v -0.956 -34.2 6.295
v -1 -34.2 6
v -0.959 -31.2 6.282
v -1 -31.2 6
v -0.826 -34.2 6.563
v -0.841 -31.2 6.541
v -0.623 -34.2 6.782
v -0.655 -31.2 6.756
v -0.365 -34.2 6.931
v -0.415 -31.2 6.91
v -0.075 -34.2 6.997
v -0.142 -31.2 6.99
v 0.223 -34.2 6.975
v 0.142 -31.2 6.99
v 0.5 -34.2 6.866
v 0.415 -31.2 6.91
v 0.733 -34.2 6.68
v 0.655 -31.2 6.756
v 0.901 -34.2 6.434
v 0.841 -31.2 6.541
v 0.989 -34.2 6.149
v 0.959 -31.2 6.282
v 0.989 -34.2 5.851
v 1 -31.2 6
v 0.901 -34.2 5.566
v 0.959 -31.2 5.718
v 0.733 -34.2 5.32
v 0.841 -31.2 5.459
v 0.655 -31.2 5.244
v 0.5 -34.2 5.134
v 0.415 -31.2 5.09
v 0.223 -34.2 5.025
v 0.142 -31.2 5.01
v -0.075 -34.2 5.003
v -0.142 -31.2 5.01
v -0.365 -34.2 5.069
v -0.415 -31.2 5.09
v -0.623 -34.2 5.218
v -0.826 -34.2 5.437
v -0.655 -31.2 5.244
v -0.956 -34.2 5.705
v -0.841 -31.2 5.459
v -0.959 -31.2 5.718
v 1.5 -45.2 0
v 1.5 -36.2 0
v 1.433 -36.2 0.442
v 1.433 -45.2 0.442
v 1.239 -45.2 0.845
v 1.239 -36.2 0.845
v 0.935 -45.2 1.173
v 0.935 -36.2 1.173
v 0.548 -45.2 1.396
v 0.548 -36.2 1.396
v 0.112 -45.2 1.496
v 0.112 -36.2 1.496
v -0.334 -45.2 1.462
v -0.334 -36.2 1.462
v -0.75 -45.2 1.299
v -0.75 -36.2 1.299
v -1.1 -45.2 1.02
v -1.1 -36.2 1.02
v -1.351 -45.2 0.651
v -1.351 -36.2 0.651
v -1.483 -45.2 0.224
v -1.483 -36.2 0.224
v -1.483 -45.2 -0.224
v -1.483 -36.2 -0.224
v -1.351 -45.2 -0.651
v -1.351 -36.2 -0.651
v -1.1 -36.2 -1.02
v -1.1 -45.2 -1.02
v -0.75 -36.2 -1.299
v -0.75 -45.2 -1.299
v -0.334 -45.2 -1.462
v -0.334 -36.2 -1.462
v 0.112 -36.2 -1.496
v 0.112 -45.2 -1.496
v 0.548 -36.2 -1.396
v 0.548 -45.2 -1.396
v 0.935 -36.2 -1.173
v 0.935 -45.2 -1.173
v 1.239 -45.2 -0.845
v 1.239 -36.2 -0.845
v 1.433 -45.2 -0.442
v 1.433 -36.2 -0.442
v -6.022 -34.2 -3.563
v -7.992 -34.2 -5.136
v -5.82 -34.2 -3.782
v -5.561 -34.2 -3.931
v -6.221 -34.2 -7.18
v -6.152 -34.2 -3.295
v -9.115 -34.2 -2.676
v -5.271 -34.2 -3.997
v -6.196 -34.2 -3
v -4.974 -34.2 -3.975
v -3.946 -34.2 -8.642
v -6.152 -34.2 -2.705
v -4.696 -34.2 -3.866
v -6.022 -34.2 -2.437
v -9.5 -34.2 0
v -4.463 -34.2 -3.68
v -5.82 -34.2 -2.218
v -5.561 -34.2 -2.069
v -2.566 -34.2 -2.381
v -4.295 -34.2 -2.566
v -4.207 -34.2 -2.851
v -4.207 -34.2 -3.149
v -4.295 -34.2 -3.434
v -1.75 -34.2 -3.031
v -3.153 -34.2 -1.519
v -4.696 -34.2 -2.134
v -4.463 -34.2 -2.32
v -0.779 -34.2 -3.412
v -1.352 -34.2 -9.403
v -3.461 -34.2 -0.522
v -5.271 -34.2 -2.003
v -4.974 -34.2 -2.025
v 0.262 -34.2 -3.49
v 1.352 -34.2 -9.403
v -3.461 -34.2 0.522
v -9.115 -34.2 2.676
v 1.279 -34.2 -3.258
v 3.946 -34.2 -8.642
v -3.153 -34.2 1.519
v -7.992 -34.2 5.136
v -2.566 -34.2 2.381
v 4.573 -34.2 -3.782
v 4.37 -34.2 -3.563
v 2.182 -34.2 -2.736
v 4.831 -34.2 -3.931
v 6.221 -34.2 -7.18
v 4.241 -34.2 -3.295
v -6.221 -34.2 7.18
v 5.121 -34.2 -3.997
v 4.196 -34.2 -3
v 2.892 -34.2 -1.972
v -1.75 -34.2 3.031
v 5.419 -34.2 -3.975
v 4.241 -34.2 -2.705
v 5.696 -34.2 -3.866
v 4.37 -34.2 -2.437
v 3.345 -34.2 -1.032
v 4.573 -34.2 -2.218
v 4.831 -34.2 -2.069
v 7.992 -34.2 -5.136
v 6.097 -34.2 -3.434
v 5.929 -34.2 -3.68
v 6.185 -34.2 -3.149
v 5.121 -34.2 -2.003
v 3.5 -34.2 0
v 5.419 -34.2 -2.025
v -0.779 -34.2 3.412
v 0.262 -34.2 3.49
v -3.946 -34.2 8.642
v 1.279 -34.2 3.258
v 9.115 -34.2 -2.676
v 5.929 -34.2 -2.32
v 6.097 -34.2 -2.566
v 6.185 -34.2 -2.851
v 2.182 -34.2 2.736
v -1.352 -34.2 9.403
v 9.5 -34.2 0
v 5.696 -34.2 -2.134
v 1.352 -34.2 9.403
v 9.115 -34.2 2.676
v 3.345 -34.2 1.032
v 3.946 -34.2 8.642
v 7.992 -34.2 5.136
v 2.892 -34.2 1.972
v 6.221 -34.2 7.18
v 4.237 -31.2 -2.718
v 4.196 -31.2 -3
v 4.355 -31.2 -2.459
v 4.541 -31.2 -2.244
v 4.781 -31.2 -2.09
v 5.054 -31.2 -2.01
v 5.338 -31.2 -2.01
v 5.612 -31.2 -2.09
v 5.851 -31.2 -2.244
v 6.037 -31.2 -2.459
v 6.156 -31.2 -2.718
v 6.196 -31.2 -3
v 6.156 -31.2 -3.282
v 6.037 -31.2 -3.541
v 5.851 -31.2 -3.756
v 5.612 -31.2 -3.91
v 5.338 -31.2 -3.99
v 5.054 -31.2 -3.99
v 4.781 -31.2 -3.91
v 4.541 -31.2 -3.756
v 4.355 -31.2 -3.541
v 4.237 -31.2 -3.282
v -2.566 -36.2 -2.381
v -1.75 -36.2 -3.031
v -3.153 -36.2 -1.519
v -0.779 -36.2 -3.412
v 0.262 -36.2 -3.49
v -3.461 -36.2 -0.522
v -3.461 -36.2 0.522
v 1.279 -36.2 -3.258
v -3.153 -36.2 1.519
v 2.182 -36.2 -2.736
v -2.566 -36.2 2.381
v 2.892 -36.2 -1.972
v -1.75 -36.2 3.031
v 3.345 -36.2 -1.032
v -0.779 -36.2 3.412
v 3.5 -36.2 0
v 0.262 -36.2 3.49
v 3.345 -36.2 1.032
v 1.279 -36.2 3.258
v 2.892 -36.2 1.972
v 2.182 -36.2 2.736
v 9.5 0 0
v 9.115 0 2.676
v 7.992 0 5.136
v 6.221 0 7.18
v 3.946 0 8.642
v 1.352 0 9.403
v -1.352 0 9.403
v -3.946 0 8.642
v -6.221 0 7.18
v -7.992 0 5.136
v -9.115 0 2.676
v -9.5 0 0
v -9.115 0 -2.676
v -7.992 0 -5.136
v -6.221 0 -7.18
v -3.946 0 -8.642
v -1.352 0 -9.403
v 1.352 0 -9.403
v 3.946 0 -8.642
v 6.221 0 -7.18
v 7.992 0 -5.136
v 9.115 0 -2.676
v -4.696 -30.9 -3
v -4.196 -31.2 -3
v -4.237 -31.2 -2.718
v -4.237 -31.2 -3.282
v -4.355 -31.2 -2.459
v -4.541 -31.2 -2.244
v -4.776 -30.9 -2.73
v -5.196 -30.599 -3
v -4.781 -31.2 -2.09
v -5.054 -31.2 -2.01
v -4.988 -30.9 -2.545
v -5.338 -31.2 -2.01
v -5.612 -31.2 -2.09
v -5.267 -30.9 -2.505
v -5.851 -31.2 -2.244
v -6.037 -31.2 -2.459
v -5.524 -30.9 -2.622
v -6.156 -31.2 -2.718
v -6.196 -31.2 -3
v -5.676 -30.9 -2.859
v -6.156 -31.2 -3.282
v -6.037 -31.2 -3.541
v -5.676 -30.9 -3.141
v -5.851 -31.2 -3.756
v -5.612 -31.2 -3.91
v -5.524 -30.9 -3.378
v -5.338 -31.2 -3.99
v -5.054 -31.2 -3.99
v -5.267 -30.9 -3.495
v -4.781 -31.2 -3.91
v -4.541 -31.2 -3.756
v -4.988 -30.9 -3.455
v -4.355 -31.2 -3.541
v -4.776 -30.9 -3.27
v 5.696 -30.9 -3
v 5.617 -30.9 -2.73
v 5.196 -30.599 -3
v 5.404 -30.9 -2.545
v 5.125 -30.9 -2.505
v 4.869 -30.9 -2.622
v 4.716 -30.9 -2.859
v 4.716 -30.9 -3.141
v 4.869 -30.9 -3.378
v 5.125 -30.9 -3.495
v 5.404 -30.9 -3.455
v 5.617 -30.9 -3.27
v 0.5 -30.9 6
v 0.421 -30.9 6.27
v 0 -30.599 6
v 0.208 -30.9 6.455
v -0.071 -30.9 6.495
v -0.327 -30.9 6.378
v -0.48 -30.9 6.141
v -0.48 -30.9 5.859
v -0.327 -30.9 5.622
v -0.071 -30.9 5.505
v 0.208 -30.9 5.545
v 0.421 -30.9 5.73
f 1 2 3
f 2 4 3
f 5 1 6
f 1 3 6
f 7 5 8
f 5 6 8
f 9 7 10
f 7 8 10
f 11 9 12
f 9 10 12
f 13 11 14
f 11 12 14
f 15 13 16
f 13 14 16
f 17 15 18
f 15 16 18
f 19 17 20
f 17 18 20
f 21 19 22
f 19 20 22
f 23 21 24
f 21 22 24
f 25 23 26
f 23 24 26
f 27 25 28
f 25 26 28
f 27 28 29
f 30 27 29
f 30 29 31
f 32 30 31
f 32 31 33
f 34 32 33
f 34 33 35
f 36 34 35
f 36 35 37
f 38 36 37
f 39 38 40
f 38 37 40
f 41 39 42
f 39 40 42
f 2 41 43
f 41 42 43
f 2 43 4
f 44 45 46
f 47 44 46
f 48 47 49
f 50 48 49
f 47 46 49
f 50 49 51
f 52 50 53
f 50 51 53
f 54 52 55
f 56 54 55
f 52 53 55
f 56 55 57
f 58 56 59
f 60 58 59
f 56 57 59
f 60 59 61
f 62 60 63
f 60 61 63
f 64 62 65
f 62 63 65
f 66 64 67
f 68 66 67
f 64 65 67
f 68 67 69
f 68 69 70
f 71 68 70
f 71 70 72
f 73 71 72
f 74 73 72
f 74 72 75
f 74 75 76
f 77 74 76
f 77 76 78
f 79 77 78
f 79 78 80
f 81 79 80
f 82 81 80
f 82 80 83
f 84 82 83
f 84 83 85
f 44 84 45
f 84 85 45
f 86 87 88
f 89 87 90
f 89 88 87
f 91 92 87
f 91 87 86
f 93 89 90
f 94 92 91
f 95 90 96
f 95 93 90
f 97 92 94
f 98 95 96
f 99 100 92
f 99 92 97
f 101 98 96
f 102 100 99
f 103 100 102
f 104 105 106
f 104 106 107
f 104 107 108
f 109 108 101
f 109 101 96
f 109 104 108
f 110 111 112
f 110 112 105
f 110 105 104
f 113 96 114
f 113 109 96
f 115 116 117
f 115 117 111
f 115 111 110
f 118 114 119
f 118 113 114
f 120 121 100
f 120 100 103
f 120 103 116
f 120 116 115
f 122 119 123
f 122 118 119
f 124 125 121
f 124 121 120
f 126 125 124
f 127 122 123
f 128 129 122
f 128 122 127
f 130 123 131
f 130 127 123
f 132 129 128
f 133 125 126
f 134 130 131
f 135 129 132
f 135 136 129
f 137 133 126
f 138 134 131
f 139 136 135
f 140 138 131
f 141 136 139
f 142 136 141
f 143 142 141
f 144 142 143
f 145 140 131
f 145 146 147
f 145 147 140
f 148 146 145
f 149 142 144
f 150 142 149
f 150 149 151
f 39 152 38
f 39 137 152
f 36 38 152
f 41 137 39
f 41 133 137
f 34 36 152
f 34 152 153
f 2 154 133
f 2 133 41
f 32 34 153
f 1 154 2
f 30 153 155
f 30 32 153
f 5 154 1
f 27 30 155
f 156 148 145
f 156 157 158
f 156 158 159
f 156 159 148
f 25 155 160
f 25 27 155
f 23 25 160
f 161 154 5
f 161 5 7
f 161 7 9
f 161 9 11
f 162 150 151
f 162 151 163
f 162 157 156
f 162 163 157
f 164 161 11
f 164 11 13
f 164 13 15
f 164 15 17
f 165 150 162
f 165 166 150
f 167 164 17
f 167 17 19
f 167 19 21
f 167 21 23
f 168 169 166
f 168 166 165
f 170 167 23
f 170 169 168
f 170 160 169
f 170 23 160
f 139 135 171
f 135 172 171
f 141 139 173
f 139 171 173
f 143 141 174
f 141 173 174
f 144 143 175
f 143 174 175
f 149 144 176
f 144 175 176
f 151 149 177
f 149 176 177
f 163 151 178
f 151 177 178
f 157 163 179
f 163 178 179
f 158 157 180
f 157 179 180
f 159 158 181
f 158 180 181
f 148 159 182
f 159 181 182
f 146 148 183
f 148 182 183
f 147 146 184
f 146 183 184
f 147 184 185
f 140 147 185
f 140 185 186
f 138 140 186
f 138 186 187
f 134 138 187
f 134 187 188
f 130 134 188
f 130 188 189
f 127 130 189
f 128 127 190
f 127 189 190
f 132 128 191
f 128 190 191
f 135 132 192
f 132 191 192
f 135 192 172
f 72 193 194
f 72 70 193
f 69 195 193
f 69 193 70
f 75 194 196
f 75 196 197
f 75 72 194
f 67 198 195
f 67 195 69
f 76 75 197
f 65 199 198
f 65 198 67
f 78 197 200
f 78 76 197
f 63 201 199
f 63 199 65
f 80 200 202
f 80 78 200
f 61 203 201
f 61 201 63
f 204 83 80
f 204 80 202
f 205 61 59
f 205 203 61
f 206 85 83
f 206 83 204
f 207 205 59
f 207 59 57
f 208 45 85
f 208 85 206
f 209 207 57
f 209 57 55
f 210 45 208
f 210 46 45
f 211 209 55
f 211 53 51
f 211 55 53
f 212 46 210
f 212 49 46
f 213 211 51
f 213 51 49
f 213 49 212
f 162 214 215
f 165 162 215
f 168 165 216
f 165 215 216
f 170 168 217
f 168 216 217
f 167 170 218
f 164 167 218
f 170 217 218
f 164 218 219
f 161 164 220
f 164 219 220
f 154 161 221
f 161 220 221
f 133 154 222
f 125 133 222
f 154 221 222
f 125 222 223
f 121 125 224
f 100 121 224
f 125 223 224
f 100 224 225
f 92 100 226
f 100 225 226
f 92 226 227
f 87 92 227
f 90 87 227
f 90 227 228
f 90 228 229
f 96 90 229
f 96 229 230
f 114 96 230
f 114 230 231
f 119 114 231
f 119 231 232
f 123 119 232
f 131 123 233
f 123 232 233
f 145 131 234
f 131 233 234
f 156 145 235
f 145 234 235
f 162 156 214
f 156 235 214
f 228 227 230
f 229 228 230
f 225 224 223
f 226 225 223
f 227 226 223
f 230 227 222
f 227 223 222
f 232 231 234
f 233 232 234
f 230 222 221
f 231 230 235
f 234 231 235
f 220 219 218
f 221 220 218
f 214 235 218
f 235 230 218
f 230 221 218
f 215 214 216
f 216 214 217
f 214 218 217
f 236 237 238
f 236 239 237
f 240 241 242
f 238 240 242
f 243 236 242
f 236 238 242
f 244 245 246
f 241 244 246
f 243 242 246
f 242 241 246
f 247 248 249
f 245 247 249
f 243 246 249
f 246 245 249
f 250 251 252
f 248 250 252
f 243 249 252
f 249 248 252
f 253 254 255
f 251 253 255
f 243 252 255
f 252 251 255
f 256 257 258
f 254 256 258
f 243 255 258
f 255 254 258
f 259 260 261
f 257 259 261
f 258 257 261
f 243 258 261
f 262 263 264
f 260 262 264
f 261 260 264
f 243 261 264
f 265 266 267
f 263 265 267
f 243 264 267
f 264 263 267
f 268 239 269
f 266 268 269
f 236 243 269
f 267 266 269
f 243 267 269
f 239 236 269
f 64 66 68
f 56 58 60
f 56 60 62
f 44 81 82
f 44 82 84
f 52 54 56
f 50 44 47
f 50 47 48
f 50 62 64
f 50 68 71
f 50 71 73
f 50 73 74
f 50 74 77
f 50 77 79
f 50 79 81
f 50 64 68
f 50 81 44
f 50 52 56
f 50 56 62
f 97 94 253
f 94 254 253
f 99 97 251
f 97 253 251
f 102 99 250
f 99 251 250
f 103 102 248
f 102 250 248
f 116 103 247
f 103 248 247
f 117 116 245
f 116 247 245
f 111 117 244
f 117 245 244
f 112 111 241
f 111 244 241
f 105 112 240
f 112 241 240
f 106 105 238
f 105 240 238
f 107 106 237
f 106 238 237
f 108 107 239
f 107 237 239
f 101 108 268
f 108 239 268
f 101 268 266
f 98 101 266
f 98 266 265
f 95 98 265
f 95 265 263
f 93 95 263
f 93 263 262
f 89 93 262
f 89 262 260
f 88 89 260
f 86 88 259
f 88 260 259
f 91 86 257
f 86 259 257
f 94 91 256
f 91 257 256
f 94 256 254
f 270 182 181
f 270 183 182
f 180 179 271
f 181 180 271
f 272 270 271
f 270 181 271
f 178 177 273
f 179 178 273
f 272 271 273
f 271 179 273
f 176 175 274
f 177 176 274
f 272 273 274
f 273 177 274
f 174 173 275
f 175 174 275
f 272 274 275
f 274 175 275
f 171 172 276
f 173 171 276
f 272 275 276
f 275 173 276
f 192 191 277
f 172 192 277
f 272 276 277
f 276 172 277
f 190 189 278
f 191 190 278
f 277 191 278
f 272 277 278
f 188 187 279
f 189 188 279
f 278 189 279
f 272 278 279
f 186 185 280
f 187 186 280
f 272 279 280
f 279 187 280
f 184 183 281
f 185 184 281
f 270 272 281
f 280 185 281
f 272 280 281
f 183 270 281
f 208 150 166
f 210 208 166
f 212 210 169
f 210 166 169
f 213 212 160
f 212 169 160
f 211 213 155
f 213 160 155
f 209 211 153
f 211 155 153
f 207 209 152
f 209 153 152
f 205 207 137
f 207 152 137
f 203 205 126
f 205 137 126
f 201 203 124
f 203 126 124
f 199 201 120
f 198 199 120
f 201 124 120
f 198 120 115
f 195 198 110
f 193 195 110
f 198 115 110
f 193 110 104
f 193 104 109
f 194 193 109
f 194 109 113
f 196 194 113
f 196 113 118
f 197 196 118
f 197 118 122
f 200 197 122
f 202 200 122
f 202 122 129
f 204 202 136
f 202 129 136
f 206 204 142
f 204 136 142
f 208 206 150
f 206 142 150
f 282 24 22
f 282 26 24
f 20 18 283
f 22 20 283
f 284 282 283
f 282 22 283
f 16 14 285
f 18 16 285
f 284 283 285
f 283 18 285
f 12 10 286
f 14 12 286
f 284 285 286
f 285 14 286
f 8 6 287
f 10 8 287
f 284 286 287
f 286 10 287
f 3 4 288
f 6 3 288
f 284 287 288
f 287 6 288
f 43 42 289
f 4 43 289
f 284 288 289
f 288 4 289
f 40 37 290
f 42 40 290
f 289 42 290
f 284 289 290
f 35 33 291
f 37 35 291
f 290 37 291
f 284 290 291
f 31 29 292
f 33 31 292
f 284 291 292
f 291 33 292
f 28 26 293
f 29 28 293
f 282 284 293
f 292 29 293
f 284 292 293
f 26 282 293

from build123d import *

# Parameters (mm, degrees)
F0_R     = 9.5
F1_DEPTH = 34.2
F2_R     = 3.5
F3_DEPTH = 2
F4_R     = 1.5
F5_DEPTH = 9
F7_D     = 2
F7_DEPTH = 3
F7_TIP   = 0.600860619


with BuildPart() as f1:
    # F0 (on Front) → F1 (new body)
    with BuildSketch(Plane.XZ):
        Circle(F0_R)
    extrude(amount=F1_DEPTH)

    # F2 (on face) → F3 (join)
    with BuildSketch(Plane.XZ.offset(34.2)):
        Circle(F2_R)
    extrude(amount=F3_DEPTH)

    # F4 (on face) → F5 (join)
    with BuildSketch(Plane.XZ.offset(36.2)):
        Circle(F4_R)
    extrude(amount=F5_DEPTH)

    # F7
    with Locations(Plane.XZ.offset(34.2)):
        with Locations((0, 6), (-5.1961524227, -3), (5.1961524227, -3)):
            Hole(F7_D / 2, depth=F7_DEPTH)
            with Locations((0, 0, -(F7_DEPTH + F7_TIP / 2))):  # 118° drill point
                Cone(0, F7_D / 2, F7_TIP, mode=Mode.SUBTRACT)


solid = f1.part
